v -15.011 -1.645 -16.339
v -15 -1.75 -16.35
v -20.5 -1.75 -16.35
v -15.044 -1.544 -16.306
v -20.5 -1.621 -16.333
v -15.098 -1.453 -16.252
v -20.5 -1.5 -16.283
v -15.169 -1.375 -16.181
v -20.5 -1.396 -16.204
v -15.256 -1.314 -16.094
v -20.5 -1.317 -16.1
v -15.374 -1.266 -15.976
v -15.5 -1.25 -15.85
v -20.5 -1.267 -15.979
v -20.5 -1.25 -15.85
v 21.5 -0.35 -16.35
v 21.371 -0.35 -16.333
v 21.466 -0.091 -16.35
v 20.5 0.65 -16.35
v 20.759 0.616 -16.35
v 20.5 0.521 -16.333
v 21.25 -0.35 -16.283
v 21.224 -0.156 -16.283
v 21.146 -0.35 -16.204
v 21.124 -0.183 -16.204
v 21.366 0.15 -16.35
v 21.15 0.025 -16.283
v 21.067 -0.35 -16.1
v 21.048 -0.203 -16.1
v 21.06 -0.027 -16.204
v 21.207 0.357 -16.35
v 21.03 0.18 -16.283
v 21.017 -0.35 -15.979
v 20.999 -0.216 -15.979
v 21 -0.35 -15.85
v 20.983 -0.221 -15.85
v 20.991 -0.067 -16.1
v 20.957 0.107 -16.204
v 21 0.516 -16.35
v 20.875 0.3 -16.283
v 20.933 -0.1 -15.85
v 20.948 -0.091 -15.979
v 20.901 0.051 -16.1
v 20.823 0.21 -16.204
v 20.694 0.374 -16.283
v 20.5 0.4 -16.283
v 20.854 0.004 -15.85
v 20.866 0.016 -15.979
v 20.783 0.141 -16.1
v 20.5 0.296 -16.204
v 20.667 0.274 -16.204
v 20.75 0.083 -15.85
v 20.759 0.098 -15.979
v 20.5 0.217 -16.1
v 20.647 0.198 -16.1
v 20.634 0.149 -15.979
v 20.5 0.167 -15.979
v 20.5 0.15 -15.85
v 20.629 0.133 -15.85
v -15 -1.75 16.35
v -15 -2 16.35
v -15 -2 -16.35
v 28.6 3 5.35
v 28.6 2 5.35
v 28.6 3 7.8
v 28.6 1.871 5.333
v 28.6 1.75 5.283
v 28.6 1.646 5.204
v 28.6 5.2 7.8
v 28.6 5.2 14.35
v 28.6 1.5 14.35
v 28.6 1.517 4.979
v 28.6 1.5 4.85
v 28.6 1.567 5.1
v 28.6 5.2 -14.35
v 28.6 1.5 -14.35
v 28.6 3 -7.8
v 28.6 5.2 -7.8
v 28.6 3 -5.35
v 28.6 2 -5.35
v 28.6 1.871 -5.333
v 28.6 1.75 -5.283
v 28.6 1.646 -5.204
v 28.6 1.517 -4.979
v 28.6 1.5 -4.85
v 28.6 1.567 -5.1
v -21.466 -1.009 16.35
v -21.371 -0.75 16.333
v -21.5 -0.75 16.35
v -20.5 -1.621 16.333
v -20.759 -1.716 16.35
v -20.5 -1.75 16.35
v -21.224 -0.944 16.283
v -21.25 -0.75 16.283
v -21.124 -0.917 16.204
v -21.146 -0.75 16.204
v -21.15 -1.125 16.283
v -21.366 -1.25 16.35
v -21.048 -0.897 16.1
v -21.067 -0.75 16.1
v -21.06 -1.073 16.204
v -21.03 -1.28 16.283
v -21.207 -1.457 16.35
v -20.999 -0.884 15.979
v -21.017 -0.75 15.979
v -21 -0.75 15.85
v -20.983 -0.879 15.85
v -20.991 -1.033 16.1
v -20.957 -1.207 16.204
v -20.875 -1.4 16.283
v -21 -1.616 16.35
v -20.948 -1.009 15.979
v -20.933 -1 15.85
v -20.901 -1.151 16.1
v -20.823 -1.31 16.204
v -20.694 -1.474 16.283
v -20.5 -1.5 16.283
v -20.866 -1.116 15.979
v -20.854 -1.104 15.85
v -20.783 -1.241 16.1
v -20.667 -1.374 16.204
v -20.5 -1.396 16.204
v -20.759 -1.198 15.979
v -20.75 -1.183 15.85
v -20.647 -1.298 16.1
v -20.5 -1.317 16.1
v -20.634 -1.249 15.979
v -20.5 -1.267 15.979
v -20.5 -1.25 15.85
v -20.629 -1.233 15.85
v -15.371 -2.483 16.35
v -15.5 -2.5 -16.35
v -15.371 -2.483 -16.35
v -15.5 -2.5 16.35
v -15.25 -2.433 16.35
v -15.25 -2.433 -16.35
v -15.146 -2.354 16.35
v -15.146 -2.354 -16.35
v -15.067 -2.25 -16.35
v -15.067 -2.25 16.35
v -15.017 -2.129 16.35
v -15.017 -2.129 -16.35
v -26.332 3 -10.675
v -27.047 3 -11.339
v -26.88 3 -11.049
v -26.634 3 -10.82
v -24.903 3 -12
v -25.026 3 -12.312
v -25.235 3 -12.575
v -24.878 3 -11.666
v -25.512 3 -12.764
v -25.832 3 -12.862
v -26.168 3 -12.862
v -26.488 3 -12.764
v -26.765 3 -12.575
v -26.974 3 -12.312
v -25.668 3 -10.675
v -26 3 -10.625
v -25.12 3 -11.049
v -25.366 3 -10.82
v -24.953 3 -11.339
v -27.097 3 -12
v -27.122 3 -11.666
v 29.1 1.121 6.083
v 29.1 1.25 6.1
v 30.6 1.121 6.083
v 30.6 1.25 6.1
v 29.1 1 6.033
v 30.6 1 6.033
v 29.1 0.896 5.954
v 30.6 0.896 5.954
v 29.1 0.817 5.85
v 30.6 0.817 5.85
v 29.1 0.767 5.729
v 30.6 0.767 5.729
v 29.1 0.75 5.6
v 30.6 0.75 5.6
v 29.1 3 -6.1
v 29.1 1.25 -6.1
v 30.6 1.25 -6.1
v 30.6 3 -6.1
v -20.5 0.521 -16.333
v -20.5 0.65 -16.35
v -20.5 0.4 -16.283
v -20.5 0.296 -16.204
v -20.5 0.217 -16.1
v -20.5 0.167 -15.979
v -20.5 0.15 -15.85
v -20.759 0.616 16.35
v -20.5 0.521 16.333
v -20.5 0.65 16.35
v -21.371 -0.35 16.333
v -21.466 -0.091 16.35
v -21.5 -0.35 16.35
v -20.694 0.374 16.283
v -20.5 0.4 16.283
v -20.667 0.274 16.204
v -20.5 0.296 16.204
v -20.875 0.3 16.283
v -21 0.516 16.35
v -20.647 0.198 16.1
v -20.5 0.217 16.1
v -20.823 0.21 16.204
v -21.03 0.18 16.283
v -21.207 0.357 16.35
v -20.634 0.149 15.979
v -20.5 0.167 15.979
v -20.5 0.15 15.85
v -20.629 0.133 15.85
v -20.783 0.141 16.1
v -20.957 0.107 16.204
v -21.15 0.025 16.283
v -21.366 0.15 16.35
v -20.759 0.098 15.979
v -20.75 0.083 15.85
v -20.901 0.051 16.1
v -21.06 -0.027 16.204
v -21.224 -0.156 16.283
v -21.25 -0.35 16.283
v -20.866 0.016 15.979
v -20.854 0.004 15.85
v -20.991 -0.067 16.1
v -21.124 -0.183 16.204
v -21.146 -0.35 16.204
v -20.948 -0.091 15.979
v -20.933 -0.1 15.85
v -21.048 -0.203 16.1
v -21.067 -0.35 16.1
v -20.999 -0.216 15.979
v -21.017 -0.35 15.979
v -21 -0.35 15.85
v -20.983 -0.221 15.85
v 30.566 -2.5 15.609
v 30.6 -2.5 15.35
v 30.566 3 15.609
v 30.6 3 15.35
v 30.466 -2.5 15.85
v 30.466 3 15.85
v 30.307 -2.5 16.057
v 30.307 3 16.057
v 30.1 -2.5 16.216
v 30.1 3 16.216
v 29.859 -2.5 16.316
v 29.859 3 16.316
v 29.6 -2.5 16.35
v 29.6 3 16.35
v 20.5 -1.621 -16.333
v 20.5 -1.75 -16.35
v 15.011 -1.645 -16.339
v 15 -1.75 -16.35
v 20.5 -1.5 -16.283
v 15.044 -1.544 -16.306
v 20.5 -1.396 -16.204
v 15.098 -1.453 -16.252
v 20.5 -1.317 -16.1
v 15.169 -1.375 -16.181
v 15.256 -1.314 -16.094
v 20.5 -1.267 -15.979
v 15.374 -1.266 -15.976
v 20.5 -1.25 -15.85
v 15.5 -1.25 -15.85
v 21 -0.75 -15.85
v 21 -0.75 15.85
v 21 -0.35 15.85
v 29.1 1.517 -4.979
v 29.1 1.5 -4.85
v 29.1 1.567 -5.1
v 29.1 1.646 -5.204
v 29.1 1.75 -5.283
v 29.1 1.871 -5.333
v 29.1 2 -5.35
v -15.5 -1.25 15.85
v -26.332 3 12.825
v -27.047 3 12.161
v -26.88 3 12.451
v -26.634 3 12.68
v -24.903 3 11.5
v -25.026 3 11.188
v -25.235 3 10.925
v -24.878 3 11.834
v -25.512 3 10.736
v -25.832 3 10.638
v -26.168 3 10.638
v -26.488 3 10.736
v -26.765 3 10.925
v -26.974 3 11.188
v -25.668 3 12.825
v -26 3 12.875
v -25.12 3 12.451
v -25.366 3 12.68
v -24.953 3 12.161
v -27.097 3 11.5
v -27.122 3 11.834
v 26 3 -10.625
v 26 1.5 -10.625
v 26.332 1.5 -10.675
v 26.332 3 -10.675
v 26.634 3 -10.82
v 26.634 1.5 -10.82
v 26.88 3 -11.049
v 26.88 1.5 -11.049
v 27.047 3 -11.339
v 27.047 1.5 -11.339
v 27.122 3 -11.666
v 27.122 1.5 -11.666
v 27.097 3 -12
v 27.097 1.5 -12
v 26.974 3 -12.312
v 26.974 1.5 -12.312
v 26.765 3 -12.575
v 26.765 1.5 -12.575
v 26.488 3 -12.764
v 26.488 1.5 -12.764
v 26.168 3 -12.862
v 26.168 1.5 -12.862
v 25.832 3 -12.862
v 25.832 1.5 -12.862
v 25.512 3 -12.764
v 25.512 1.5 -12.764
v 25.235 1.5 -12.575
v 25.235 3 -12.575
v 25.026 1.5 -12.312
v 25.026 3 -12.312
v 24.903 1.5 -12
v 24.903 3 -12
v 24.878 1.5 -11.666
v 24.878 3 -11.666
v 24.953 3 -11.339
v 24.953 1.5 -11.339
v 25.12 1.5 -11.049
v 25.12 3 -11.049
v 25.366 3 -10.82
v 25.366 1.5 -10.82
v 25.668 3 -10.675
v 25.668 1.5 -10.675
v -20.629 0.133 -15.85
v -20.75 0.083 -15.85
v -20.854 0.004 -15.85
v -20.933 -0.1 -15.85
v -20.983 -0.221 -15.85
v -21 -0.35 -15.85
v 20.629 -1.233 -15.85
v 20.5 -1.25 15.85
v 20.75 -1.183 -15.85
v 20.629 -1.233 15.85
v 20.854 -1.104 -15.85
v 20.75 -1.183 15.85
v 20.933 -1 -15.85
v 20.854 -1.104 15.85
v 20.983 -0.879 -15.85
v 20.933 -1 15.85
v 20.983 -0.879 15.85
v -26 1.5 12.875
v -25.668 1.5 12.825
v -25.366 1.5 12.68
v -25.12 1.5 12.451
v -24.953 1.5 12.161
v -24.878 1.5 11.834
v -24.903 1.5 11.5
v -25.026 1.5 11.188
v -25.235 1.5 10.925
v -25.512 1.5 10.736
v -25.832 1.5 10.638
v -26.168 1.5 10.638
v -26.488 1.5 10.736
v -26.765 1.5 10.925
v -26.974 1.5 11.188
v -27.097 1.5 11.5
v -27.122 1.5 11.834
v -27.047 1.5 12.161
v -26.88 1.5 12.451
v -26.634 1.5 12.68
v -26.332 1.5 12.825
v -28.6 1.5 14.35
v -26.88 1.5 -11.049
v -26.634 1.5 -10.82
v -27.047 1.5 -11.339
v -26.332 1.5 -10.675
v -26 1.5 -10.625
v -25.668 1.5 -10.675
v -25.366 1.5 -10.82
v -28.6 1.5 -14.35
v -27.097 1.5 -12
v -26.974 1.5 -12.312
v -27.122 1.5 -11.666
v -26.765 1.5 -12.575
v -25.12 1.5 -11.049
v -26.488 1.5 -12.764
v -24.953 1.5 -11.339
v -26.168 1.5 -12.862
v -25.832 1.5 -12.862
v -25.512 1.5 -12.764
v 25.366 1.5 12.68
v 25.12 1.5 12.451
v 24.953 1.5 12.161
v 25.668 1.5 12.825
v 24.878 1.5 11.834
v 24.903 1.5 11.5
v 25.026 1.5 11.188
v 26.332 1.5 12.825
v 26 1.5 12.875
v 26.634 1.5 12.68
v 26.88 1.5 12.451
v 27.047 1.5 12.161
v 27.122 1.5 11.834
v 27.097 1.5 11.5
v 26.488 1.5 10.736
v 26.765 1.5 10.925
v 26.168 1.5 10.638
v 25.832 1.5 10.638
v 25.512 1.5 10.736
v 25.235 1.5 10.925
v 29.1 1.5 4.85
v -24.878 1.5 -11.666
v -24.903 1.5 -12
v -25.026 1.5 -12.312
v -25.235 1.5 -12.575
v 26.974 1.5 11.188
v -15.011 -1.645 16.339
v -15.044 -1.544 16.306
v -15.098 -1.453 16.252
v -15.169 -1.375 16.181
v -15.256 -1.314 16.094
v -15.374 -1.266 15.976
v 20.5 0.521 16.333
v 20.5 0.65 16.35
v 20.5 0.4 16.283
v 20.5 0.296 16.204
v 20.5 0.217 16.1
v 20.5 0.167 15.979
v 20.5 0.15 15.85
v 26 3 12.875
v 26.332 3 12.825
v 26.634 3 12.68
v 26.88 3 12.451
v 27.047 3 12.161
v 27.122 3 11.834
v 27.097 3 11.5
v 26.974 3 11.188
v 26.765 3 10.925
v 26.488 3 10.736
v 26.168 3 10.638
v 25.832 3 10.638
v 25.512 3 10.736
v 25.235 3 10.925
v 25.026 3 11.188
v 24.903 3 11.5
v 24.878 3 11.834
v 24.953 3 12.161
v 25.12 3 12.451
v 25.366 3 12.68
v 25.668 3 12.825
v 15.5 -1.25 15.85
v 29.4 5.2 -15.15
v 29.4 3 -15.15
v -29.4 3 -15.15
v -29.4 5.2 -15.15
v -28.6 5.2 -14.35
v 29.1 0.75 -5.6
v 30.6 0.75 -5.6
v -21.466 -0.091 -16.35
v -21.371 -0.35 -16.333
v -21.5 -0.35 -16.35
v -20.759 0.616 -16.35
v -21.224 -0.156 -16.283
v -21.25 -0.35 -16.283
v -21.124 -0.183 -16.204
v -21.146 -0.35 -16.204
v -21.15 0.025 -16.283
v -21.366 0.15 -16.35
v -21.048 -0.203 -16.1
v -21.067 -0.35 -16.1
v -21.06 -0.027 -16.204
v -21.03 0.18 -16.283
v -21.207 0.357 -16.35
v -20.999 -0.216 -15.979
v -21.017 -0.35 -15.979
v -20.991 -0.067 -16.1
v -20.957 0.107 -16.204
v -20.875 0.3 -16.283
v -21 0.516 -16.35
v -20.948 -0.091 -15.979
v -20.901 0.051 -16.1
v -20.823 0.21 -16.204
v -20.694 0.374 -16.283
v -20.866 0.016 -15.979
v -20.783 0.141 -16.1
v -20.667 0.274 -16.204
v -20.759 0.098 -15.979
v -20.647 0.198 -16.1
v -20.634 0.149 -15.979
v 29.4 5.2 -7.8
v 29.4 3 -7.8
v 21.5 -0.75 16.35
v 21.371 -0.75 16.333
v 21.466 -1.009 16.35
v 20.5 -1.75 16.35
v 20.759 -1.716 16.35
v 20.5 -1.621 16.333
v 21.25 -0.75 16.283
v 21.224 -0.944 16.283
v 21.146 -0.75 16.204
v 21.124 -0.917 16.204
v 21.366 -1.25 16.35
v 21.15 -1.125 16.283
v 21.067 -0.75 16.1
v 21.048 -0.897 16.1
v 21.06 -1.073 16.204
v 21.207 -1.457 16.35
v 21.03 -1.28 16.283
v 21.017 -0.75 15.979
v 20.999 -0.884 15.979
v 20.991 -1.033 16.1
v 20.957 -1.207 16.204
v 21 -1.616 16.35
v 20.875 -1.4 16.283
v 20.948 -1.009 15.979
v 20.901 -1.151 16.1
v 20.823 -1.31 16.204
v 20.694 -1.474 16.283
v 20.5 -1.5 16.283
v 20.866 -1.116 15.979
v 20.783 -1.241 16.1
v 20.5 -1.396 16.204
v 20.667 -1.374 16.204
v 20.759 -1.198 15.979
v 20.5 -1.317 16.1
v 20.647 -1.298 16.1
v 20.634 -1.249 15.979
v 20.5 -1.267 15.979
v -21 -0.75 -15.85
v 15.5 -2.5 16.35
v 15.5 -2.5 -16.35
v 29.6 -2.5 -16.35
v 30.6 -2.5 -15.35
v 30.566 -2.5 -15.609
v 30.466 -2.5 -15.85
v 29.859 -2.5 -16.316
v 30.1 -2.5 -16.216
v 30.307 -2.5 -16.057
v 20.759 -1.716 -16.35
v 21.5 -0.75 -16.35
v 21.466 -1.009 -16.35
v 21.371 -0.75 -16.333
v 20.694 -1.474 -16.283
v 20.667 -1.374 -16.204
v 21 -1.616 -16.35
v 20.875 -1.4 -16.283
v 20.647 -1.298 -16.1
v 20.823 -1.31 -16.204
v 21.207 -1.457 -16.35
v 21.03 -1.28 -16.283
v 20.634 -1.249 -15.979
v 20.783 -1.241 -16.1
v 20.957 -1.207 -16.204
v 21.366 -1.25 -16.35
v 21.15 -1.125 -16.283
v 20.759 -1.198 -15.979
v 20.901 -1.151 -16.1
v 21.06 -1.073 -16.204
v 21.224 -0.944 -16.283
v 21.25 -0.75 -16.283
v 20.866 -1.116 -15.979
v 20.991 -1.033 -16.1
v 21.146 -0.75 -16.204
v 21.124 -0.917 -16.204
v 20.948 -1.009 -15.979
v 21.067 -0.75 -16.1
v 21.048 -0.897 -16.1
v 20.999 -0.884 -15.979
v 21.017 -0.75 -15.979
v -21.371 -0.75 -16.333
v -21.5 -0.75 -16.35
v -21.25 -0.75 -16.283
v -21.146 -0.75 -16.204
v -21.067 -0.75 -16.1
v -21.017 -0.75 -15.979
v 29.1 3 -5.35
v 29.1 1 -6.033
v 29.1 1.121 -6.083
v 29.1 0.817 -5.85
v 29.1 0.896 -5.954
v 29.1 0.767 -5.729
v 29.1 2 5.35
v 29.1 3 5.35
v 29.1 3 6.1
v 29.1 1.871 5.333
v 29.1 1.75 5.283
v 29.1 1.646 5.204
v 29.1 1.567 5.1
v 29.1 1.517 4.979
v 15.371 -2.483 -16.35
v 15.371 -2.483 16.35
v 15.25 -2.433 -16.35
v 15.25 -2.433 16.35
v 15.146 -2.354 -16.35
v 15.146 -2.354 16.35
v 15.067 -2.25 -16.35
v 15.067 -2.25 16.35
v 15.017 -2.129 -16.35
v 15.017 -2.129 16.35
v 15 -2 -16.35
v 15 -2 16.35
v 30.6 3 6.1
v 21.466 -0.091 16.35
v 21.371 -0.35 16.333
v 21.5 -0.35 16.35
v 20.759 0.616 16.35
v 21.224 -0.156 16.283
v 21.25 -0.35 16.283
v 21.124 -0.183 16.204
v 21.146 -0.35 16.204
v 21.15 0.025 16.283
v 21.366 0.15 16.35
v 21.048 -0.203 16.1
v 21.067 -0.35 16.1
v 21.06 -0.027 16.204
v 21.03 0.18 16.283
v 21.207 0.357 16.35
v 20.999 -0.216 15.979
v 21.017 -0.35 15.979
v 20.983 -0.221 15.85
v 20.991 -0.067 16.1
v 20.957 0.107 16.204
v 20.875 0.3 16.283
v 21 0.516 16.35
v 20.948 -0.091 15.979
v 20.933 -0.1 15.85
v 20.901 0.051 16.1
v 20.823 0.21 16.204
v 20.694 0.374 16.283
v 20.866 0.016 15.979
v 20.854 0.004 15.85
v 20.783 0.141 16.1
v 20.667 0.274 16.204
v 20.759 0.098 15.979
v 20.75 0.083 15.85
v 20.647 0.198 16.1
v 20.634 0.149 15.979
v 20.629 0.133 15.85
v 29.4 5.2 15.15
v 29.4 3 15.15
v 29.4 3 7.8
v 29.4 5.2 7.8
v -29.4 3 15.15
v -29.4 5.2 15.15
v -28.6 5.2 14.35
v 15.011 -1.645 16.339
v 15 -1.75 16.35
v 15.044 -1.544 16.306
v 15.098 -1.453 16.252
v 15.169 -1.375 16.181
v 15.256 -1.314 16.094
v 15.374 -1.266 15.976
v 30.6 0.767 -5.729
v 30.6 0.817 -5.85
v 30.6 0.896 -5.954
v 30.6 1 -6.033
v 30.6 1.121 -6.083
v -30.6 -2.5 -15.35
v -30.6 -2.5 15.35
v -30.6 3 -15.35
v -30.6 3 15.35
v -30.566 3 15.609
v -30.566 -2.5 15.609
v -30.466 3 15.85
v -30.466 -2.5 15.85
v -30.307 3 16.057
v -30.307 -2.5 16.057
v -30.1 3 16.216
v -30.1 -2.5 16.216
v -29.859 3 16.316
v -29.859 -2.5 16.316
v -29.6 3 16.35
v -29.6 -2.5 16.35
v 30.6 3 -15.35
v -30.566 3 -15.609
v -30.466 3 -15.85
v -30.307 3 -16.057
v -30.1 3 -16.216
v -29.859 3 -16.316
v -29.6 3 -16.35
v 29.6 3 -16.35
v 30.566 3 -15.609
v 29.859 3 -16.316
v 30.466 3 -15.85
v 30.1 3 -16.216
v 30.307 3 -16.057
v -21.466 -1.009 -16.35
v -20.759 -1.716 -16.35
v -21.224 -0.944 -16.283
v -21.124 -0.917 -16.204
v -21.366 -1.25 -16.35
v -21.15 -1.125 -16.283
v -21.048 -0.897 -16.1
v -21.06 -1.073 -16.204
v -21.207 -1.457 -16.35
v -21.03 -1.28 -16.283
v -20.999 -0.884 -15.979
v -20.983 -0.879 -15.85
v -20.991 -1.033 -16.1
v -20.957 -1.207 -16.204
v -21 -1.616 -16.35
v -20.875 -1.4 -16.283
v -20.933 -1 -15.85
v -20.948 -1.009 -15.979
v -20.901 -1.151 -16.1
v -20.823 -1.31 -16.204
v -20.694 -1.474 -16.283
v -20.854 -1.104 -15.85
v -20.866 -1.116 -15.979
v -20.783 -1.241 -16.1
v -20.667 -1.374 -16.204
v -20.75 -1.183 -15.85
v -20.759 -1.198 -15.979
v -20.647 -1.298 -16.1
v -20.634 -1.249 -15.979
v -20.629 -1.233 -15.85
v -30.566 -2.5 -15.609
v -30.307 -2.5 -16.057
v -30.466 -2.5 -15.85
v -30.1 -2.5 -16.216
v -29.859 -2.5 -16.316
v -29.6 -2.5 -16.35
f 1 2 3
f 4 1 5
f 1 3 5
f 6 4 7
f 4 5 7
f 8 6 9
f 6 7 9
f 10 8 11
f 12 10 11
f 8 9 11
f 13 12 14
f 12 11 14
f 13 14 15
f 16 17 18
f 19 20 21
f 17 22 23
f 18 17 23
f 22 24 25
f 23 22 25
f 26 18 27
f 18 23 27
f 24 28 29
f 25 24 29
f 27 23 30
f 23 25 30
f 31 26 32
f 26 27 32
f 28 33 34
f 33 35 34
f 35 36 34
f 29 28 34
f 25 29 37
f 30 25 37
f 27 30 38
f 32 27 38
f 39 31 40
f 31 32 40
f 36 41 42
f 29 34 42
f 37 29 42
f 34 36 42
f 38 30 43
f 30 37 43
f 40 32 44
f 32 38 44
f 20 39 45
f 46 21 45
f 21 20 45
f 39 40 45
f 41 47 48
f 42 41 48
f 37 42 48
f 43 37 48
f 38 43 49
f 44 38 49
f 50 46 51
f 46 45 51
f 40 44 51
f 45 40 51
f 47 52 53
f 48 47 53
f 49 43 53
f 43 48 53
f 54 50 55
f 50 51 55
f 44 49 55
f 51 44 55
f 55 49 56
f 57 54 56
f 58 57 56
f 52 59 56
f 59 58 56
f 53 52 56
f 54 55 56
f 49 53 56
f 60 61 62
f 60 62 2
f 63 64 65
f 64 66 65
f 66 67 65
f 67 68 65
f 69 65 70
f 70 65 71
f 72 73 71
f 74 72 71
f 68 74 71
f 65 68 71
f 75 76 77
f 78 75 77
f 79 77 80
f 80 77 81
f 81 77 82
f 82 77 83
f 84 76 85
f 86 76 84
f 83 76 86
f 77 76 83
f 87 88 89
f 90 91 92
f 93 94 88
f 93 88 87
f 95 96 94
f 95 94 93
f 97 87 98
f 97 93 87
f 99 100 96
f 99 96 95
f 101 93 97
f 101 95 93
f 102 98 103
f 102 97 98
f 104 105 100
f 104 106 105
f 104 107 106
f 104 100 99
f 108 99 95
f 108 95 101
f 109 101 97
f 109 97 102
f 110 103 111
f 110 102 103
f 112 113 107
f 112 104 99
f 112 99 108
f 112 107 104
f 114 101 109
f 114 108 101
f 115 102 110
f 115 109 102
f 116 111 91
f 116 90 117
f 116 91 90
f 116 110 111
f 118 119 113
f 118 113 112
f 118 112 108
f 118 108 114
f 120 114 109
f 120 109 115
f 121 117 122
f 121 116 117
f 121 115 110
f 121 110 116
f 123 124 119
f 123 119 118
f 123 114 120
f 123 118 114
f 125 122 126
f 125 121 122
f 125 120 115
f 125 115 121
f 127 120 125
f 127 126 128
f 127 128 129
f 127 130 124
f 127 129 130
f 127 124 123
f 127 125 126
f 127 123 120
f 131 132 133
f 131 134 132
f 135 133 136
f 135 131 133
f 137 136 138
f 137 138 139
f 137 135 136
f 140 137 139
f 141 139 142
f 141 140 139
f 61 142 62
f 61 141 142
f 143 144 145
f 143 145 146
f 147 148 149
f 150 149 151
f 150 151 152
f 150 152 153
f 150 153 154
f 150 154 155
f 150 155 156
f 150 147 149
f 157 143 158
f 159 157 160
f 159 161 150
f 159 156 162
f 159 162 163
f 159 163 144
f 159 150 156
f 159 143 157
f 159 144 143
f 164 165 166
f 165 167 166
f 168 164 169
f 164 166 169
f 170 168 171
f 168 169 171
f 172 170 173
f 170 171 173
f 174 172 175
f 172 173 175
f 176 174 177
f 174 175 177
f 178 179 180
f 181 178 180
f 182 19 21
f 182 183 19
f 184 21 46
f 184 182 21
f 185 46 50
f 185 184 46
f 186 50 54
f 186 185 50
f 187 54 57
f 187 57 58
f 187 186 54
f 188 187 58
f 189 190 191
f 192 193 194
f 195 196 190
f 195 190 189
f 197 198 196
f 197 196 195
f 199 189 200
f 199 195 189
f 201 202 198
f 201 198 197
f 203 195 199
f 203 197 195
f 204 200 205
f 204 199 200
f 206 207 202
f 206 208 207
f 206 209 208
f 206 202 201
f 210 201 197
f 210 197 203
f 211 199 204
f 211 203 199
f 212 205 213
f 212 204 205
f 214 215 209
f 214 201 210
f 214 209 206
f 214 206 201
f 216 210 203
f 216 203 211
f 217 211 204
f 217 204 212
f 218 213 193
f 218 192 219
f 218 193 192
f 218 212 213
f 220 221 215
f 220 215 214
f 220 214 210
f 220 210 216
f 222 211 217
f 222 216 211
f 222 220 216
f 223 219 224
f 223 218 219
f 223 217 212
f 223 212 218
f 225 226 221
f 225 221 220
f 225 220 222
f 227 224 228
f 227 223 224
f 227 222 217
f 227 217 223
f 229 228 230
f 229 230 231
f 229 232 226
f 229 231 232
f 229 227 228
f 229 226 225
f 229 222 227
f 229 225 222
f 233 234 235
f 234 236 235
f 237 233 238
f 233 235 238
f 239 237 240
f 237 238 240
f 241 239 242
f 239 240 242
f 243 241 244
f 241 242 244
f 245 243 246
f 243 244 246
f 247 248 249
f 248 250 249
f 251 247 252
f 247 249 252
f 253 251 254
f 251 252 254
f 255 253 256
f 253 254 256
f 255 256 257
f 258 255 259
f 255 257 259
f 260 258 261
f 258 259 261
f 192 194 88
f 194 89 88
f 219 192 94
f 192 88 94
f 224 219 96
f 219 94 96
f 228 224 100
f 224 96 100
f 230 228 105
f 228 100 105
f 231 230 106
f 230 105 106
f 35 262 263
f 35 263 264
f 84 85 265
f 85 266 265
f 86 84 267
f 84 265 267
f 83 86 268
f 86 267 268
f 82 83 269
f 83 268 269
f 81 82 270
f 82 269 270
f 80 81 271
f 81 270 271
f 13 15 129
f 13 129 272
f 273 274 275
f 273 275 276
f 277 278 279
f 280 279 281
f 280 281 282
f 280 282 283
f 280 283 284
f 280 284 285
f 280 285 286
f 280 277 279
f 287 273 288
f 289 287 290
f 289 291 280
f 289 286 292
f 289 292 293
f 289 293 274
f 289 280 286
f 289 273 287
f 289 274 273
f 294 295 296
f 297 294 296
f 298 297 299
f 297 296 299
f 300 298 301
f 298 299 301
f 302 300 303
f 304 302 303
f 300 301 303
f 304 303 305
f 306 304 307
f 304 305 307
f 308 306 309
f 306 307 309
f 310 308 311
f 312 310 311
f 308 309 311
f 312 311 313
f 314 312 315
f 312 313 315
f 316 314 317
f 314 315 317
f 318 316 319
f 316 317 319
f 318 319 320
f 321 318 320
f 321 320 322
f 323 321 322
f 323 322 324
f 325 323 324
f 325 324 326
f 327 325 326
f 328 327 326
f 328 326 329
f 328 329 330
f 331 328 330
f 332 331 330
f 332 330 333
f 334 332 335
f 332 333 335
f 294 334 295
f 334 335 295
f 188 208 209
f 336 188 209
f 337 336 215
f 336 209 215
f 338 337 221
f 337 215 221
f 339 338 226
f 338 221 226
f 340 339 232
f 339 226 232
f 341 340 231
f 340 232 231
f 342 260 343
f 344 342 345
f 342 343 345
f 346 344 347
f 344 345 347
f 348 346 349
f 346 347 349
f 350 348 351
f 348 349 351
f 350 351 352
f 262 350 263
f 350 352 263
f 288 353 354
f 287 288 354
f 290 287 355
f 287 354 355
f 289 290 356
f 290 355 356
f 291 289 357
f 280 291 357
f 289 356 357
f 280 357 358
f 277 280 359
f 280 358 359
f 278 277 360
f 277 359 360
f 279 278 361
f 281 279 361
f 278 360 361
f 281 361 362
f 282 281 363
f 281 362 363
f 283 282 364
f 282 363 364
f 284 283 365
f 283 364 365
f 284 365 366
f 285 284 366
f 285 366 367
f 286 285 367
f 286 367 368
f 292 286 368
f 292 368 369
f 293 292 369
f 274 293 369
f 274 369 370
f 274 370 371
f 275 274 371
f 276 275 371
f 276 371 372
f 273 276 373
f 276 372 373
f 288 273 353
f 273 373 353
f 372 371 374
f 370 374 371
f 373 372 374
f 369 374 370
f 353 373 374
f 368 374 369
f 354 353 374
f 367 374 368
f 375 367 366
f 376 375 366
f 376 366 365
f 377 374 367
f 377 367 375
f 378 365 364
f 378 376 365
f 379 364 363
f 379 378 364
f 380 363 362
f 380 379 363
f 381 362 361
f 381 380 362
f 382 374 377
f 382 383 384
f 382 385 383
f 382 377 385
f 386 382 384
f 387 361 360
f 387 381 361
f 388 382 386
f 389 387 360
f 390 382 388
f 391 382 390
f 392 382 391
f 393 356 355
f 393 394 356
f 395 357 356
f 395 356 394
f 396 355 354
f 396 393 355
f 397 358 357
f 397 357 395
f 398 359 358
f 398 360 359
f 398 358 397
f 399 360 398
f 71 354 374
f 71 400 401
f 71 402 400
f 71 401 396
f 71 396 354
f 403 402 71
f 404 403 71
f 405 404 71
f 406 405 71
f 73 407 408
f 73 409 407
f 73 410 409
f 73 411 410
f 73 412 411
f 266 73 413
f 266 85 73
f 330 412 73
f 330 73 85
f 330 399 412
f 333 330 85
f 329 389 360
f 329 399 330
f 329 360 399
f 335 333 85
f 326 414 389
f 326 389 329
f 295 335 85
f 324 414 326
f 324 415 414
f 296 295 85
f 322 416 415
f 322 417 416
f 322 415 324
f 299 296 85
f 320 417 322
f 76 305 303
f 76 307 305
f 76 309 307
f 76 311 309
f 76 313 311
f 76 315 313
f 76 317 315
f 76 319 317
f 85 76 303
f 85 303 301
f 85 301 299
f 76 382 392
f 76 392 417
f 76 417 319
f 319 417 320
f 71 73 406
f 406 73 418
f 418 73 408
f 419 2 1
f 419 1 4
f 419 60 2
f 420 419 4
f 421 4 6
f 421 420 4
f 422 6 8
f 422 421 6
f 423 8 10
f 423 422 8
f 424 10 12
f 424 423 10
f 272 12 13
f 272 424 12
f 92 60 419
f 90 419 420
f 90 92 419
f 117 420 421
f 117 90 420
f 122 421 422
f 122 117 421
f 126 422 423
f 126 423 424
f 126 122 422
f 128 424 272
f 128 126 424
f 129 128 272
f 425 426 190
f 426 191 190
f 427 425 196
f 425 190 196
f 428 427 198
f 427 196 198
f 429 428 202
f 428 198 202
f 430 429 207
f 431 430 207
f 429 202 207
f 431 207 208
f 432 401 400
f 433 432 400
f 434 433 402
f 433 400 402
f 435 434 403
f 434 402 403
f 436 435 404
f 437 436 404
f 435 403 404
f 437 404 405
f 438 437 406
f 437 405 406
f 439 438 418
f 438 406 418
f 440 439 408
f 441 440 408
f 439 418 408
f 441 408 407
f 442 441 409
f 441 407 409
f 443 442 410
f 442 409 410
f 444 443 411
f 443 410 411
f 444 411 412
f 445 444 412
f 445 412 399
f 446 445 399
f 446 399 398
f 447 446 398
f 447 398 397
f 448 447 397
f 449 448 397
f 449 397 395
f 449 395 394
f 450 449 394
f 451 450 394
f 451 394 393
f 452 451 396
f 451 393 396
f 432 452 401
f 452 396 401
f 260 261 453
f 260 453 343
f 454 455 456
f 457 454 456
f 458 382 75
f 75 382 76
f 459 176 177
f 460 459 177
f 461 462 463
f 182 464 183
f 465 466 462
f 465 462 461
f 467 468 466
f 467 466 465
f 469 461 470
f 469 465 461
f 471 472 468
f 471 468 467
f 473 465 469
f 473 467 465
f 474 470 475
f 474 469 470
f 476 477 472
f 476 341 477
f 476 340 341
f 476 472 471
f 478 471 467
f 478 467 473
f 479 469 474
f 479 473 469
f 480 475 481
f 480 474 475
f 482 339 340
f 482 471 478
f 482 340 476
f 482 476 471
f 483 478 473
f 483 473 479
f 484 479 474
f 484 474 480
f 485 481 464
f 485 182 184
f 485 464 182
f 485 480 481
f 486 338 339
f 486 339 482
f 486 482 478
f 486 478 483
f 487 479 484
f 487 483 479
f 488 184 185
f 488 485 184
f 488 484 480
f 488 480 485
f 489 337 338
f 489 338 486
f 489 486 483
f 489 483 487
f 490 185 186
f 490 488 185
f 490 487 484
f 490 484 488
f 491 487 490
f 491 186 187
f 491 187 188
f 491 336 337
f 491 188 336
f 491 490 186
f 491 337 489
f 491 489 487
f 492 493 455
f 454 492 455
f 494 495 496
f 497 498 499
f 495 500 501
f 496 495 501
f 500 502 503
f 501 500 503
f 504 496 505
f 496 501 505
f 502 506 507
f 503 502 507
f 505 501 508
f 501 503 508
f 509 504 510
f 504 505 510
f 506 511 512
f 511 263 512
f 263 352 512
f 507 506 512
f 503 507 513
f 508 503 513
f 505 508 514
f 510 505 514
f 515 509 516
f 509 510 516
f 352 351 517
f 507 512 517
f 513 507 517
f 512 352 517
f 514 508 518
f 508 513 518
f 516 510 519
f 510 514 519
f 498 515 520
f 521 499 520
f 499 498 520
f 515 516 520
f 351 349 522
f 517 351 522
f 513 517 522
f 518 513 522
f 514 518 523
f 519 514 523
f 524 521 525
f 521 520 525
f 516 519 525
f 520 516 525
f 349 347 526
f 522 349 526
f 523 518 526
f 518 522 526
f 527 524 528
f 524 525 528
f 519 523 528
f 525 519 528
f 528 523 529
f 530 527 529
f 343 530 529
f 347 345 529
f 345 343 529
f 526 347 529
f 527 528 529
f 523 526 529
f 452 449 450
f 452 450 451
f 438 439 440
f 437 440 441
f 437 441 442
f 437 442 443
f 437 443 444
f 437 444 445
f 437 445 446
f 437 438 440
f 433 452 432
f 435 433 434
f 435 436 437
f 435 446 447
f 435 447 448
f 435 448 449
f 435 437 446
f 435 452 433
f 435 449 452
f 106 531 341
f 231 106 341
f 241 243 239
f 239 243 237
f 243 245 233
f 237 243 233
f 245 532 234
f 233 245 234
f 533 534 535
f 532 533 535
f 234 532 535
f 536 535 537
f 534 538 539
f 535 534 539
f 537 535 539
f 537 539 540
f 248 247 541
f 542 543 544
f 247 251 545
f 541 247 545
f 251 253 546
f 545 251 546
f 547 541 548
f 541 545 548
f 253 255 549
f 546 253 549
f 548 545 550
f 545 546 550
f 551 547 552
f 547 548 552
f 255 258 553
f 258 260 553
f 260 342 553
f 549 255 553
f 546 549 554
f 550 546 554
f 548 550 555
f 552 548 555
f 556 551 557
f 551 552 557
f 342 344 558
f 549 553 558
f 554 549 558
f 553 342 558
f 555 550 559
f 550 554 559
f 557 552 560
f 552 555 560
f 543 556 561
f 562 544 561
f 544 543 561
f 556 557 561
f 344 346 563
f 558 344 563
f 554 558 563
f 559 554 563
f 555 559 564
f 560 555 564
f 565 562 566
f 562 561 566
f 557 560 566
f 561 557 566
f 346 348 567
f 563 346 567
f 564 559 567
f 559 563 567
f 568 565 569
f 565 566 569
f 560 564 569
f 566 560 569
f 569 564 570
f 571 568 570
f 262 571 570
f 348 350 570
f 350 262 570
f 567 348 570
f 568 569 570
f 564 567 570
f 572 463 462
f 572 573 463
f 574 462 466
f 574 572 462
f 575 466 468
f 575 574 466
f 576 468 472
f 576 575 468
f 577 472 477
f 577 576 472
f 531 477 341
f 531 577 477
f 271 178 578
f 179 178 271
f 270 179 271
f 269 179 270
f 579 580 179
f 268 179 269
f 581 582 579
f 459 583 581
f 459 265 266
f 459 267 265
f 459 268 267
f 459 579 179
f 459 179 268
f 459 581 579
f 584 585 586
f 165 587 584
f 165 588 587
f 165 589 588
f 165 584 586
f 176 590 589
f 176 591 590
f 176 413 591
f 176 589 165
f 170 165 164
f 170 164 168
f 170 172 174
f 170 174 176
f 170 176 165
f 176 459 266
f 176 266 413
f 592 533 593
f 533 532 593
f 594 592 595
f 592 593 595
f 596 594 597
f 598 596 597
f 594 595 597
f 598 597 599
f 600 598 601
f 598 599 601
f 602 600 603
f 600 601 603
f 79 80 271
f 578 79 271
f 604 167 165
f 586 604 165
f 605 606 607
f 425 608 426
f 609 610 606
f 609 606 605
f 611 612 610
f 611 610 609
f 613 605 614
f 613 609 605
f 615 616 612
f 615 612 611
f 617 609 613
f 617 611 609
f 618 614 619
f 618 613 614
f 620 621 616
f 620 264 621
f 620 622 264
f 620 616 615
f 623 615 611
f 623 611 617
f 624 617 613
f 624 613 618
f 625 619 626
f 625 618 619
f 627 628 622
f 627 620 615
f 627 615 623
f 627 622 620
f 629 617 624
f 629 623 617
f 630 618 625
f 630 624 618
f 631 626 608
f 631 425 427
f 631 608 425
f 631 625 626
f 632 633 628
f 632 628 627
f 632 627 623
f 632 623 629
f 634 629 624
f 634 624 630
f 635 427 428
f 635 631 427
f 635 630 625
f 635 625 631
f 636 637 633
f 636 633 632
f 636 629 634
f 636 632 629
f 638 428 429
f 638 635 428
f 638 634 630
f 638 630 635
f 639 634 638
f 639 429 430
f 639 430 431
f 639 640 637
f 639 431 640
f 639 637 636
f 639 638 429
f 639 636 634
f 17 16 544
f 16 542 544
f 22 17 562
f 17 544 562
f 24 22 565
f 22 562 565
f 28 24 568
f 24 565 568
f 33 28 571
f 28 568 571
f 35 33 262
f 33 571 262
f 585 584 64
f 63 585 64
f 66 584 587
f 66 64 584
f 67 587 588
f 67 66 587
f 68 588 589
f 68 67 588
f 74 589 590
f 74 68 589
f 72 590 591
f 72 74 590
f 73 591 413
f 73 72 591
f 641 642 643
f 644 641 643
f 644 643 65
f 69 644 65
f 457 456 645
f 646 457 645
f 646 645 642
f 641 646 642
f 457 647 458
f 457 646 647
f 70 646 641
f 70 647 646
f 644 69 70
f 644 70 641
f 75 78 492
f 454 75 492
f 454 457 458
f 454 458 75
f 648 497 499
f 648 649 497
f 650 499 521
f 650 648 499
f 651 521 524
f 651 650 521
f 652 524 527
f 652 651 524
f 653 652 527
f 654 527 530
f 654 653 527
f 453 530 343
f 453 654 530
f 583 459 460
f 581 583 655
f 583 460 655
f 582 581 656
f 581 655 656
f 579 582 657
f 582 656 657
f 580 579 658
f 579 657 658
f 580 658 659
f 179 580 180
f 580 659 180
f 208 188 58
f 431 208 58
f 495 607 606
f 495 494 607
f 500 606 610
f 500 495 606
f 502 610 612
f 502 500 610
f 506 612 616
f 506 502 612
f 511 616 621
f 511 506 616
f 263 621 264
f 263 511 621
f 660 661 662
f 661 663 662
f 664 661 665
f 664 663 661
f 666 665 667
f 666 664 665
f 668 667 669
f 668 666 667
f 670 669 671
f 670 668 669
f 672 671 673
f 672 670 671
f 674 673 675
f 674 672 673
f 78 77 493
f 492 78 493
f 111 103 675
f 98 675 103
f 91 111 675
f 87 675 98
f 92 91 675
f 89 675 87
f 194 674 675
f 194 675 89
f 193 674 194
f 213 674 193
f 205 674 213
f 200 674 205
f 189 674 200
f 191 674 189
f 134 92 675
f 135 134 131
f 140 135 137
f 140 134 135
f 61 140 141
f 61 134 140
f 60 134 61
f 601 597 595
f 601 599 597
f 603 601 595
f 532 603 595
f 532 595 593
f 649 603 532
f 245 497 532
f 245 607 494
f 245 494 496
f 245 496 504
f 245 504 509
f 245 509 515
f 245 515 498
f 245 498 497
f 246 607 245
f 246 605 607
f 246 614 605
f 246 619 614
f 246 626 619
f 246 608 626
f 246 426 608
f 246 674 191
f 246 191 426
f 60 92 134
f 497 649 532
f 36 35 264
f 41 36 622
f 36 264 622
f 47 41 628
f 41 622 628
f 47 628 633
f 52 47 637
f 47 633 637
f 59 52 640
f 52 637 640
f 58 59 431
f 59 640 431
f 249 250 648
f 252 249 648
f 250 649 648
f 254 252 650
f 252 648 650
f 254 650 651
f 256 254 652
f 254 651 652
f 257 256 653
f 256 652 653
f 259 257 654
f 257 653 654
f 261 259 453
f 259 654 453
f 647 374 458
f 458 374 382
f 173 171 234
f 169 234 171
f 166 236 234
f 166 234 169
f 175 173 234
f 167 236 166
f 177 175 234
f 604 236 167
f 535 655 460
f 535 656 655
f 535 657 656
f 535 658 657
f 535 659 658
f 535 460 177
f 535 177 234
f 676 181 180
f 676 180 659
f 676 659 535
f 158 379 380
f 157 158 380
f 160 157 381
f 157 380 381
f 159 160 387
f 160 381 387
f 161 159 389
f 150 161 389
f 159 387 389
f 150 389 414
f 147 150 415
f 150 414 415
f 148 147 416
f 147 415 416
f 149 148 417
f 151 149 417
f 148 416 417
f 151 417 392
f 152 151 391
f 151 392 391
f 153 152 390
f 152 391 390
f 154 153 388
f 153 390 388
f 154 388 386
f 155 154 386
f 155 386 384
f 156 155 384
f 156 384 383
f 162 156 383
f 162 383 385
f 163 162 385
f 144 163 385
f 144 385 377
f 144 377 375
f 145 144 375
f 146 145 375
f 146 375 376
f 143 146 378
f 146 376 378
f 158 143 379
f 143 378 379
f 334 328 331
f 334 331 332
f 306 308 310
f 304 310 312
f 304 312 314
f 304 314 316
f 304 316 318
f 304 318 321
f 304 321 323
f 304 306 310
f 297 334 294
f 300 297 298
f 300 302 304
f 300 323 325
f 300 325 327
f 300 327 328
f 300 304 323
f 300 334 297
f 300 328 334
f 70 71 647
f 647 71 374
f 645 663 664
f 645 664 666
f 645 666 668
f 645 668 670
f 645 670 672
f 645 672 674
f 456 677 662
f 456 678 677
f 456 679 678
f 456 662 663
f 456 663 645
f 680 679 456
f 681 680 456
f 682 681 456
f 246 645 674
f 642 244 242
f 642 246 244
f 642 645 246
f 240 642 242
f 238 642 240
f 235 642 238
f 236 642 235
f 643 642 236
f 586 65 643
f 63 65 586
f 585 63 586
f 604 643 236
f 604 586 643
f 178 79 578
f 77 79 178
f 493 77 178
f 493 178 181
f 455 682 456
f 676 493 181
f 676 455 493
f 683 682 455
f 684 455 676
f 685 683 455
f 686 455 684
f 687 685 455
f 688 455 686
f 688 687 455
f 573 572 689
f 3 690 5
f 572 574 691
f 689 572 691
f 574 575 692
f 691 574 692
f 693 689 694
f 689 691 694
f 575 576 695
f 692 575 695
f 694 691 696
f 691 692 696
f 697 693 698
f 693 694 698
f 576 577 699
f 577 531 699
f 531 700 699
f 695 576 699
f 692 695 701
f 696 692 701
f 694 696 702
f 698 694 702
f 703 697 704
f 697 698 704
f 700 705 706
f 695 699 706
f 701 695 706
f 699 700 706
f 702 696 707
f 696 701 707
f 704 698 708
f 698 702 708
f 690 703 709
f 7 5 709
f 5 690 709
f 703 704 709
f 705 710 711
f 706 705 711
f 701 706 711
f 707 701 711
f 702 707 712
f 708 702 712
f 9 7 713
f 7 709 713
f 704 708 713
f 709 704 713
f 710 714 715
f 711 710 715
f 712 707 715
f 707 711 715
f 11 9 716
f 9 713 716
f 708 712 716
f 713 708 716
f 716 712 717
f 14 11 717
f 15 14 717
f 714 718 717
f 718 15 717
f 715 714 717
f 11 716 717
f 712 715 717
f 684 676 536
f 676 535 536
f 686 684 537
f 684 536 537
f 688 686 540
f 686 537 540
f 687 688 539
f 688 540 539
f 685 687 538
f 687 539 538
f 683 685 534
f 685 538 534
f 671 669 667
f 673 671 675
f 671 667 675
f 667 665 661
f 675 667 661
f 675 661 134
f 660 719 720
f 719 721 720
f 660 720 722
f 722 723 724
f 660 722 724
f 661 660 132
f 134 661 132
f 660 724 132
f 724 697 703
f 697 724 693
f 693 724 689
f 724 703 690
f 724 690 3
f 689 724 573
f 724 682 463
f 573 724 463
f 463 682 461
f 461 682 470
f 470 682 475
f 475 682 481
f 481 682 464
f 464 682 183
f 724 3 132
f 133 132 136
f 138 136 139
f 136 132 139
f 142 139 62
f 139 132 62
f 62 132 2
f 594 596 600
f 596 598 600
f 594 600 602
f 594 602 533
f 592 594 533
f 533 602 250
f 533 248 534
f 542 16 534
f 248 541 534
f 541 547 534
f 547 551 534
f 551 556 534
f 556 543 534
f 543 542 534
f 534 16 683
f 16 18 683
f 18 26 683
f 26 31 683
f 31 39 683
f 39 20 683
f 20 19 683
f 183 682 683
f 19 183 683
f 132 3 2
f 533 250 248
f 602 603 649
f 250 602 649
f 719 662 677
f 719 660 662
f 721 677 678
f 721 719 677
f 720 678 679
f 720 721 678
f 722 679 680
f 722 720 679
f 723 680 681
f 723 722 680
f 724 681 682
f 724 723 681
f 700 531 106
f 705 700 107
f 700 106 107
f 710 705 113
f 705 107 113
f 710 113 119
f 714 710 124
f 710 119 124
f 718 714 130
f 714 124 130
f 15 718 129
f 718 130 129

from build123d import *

# Parameters (mm, degrees)
SKETCH2_W               = 61.2
SKETCH2_H               = 32.7
BOSS_EXTRUDE1_DEPTH     = 1.5
BOSS_EXTRUDE2_START     = 1.5
SKETCH2_3_R             = 1.125
BOSS_EXTRUDE2_DEPTH     = 1.5
SKETCH2_4_W             = 61.2
SKETCH2_4_H             = 32.7
BOSS_EXTRUDE3_DEPTH     = 2.5
FILLET1_R               = 1
CUT_EXTRUDE1_DEPTH      = 35.823591142
CUT_EXTRUDE1_DEPTH_BACK = 35.823591142
SKETCH3_W               = 42
SKETCH3_H               = 1.4
SKETCH3_W_2             = 20
SKETCH3_H_2             = 1.25
CUT_EXTRUDE3_DEPTH      = 35.823591142
CUT_EXTRUDE3_DEPTH_BACK = 35.823591142
SKETCH3_4_W             = 5
SKETCH3_4_H             = 1.25
SKETCH3_4_W_2           = 20
FILLET2_R               = 0.5
CUT_EXTRUDE2_START      = 0.75
SKETCH2_5_W             = 1.5
SKETCH2_5_H             = 0.75
SKETCH2_5_H_2           = 10.7
CUT_EXTRUDE2_DEPTH      = 2.25
FILLET3_R               = 0.5
BOSS_EXTRUDE4_DEPTH     = 2.2


with BuildPart() as part:
    # Sketch2 → Boss-Extrude1 (new body)
    with BuildSketch(Plane(origin=(0, 0, 0), x_dir=(1, 0, 0), z_dir=(0, 1, 0))):
        Rectangle(SKETCH2_W, SKETCH2_H)
    extrude(amount=BOSS_EXTRUDE1_DEPTH)

    # Sketch2<3> → Boss-Extrude2 (add)
    with BuildSketch(Plane(origin=(0, 0, 0), x_dir=(1, 0, 0), z_dir=(0, 1, 0)).offset(BOSS_EXTRUDE2_START)):
        Polygon((-30.6, 16.35), (-30.6, -16.35), (30.6, -16.35), (30.6, -6.1), (29.1, -6.1), (29.1, -5.35), (28.6, -5.35), (28.6, -14.35), (-28.6, -14.35), (-28.6, 14.35), (28.6, 14.35), (28.6, 5.35), (30.6, 5.35), (30.6, 16.35), align=None)
        with Locations(Location((-26, 11.75, 0), (0, 0, 270))):
            Circle(SKETCH2_3_R)
        with Locations(Location((-26, -11.75, 0), (0, 0, 270))):
            Circle(SKETCH2_3_R)
        with Locations(Location((26, -11.75, 0), (0, 0, 270))):
            Circle(SKETCH2_3_R)
        with Locations(Location((26, 11.75, 0), (0, 0, 270))):
            Circle(SKETCH2_3_R)
    extrude(amount=BOSS_EXTRUDE2_DEPTH)

    # Sketch2<4> → Boss-Extrude3 (add)
    with BuildSketch(Plane(origin=(0, 0, 0), x_dir=(1, 0, 0), z_dir=(0, 1, 0))):
        Rectangle(SKETCH2_4_W, SKETCH2_4_H)
    extrude(amount=-BOSS_EXTRUDE3_DEPTH)

    # Fillet1
    fillet1_edges = [part.edges().sort_by_distance(p)[0] for p in [
        (-30.6, 0.25, -16.35),
        (30.6, 0.25, -16.35),
        (30.6, 0.25, 16.35),
        (-30.6, 0.25, 16.35),
    ]]
    fillet(fillet1_edges, radius=FILLET1_R)

    # Sketch3 → Cut-Extrude1 (cut, two sides: drawn at the far end of the back side and taken through both)
    with BuildSketch(Plane.XY.offset(-CUT_EXTRUDE1_DEPTH_BACK)):
        with Locations((0, -0.55)):
            Rectangle(SKETCH3_W, SKETCH3_H)
        with Locations((0, -1.875)):
            Rectangle(SKETCH3_W_2, SKETCH3_H_2)
    extrude(amount=CUT_EXTRUDE1_DEPTH + CUT_EXTRUDE1_DEPTH_BACK, mode=Mode.SUBTRACT)

    # Sketch3<4> → Cut-Extrude3 (cut, two sides: drawn at the far end of the back side and taken through both)
    with BuildSketch(Plane.XY.offset(-CUT_EXTRUDE3_DEPTH_BACK)):
        with Locations((12.5, -1.875)):
            Rectangle(SKETCH3_4_W, SKETCH3_4_H)
        with Locations((0, -1.875)):
            Rectangle(SKETCH3_4_W_2, SKETCH3_4_H)
        with Locations((-12.5, -1.875)):
            Rectangle(SKETCH3_4_W, SKETCH3_4_H)
    extrude(amount=CUT_EXTRUDE3_DEPTH + CUT_EXTRUDE3_DEPTH_BACK, mode=Mode.SUBTRACT)

    # Fillet2
    fillet2_edges = [part.edges().sort_by_distance(p)[0] for p in [
        (-18, -1.25, -16.35),
        (-21, -1.25, 0),
        (-21, -0.55, 16.35),
        (-21, 0.15, 0),
        (0, 0.15, 16.35),
        (21, 0.15, 0),
        (21, -0.55, -16.35),
        (21, -1.25, 0),
        (-21, -0.55, -16.35),
        (0, 0.15, -16.35),
        (-18, -1.25, 16.35),
        (21, -0.55, 16.35),
        (18, -1.25, -16.35),
        (18, -1.25, 16.35),
        (-15, -1.25, 0),
        (15, -2.5, 0),
        (-15, -2.5, 0),
        (15, -1.25, 0),
    ]]
    fillet(fillet2_edges, radius=FILLET2_R)

    # Sketch2<5> → Cut-Extrude2 (cut)
    with BuildSketch(Plane(origin=(0, 0, 0), x_dir=(1, 0, 0), z_dir=(0, 1, 0)).offset(CUT_EXTRUDE2_START)):
        with Locations((29.85, 5.725)):
            Rectangle(SKETCH2_5_W, SKETCH2_5_H)
        with Locations((29.85, 0)):
            Rectangle(SKETCH2_5_W, SKETCH2_5_H_2)
        with Locations((29.85, -5.725)):
            Rectangle(SKETCH2_5_W, SKETCH2_5_H)
    extrude(amount=CUT_EXTRUDE2_DEPTH, mode=Mode.SUBTRACT)

    # Fillet3
    fillet3_edges = [part.edges().sort_by_distance(p)[0] for p in [
        (29.85, 0.75, 6.1),
        (29.85, 0.75, -6.1),
        (28.85, 1.5, -5.35),
        (28.85, 1.5, 5.35),
    ]]
    fillet(fillet3_edges, radius=FILLET3_R)

    # Sketch4 → Boss-Extrude4 (add)
    with BuildSketch(Plane(origin=(0, 3, 0), x_dir=(1, 0, 0), z_dir=(0, 1, 0))):
        Polygon((29.4, 15.15), (-29.4, 15.15), (-29.4, -15.15), (29.4, -15.15), (29.4, -7.8), (28.6, -7.8), (28.6, -14.35), (-28.6, -14.35), (-28.6, 14.35), (28.6, 14.35), (28.6, 7.8), (29.4, 7.8), align=None)
    extrude(amount=BOSS_EXTRUDE4_DEPTH)


solid = part.part
